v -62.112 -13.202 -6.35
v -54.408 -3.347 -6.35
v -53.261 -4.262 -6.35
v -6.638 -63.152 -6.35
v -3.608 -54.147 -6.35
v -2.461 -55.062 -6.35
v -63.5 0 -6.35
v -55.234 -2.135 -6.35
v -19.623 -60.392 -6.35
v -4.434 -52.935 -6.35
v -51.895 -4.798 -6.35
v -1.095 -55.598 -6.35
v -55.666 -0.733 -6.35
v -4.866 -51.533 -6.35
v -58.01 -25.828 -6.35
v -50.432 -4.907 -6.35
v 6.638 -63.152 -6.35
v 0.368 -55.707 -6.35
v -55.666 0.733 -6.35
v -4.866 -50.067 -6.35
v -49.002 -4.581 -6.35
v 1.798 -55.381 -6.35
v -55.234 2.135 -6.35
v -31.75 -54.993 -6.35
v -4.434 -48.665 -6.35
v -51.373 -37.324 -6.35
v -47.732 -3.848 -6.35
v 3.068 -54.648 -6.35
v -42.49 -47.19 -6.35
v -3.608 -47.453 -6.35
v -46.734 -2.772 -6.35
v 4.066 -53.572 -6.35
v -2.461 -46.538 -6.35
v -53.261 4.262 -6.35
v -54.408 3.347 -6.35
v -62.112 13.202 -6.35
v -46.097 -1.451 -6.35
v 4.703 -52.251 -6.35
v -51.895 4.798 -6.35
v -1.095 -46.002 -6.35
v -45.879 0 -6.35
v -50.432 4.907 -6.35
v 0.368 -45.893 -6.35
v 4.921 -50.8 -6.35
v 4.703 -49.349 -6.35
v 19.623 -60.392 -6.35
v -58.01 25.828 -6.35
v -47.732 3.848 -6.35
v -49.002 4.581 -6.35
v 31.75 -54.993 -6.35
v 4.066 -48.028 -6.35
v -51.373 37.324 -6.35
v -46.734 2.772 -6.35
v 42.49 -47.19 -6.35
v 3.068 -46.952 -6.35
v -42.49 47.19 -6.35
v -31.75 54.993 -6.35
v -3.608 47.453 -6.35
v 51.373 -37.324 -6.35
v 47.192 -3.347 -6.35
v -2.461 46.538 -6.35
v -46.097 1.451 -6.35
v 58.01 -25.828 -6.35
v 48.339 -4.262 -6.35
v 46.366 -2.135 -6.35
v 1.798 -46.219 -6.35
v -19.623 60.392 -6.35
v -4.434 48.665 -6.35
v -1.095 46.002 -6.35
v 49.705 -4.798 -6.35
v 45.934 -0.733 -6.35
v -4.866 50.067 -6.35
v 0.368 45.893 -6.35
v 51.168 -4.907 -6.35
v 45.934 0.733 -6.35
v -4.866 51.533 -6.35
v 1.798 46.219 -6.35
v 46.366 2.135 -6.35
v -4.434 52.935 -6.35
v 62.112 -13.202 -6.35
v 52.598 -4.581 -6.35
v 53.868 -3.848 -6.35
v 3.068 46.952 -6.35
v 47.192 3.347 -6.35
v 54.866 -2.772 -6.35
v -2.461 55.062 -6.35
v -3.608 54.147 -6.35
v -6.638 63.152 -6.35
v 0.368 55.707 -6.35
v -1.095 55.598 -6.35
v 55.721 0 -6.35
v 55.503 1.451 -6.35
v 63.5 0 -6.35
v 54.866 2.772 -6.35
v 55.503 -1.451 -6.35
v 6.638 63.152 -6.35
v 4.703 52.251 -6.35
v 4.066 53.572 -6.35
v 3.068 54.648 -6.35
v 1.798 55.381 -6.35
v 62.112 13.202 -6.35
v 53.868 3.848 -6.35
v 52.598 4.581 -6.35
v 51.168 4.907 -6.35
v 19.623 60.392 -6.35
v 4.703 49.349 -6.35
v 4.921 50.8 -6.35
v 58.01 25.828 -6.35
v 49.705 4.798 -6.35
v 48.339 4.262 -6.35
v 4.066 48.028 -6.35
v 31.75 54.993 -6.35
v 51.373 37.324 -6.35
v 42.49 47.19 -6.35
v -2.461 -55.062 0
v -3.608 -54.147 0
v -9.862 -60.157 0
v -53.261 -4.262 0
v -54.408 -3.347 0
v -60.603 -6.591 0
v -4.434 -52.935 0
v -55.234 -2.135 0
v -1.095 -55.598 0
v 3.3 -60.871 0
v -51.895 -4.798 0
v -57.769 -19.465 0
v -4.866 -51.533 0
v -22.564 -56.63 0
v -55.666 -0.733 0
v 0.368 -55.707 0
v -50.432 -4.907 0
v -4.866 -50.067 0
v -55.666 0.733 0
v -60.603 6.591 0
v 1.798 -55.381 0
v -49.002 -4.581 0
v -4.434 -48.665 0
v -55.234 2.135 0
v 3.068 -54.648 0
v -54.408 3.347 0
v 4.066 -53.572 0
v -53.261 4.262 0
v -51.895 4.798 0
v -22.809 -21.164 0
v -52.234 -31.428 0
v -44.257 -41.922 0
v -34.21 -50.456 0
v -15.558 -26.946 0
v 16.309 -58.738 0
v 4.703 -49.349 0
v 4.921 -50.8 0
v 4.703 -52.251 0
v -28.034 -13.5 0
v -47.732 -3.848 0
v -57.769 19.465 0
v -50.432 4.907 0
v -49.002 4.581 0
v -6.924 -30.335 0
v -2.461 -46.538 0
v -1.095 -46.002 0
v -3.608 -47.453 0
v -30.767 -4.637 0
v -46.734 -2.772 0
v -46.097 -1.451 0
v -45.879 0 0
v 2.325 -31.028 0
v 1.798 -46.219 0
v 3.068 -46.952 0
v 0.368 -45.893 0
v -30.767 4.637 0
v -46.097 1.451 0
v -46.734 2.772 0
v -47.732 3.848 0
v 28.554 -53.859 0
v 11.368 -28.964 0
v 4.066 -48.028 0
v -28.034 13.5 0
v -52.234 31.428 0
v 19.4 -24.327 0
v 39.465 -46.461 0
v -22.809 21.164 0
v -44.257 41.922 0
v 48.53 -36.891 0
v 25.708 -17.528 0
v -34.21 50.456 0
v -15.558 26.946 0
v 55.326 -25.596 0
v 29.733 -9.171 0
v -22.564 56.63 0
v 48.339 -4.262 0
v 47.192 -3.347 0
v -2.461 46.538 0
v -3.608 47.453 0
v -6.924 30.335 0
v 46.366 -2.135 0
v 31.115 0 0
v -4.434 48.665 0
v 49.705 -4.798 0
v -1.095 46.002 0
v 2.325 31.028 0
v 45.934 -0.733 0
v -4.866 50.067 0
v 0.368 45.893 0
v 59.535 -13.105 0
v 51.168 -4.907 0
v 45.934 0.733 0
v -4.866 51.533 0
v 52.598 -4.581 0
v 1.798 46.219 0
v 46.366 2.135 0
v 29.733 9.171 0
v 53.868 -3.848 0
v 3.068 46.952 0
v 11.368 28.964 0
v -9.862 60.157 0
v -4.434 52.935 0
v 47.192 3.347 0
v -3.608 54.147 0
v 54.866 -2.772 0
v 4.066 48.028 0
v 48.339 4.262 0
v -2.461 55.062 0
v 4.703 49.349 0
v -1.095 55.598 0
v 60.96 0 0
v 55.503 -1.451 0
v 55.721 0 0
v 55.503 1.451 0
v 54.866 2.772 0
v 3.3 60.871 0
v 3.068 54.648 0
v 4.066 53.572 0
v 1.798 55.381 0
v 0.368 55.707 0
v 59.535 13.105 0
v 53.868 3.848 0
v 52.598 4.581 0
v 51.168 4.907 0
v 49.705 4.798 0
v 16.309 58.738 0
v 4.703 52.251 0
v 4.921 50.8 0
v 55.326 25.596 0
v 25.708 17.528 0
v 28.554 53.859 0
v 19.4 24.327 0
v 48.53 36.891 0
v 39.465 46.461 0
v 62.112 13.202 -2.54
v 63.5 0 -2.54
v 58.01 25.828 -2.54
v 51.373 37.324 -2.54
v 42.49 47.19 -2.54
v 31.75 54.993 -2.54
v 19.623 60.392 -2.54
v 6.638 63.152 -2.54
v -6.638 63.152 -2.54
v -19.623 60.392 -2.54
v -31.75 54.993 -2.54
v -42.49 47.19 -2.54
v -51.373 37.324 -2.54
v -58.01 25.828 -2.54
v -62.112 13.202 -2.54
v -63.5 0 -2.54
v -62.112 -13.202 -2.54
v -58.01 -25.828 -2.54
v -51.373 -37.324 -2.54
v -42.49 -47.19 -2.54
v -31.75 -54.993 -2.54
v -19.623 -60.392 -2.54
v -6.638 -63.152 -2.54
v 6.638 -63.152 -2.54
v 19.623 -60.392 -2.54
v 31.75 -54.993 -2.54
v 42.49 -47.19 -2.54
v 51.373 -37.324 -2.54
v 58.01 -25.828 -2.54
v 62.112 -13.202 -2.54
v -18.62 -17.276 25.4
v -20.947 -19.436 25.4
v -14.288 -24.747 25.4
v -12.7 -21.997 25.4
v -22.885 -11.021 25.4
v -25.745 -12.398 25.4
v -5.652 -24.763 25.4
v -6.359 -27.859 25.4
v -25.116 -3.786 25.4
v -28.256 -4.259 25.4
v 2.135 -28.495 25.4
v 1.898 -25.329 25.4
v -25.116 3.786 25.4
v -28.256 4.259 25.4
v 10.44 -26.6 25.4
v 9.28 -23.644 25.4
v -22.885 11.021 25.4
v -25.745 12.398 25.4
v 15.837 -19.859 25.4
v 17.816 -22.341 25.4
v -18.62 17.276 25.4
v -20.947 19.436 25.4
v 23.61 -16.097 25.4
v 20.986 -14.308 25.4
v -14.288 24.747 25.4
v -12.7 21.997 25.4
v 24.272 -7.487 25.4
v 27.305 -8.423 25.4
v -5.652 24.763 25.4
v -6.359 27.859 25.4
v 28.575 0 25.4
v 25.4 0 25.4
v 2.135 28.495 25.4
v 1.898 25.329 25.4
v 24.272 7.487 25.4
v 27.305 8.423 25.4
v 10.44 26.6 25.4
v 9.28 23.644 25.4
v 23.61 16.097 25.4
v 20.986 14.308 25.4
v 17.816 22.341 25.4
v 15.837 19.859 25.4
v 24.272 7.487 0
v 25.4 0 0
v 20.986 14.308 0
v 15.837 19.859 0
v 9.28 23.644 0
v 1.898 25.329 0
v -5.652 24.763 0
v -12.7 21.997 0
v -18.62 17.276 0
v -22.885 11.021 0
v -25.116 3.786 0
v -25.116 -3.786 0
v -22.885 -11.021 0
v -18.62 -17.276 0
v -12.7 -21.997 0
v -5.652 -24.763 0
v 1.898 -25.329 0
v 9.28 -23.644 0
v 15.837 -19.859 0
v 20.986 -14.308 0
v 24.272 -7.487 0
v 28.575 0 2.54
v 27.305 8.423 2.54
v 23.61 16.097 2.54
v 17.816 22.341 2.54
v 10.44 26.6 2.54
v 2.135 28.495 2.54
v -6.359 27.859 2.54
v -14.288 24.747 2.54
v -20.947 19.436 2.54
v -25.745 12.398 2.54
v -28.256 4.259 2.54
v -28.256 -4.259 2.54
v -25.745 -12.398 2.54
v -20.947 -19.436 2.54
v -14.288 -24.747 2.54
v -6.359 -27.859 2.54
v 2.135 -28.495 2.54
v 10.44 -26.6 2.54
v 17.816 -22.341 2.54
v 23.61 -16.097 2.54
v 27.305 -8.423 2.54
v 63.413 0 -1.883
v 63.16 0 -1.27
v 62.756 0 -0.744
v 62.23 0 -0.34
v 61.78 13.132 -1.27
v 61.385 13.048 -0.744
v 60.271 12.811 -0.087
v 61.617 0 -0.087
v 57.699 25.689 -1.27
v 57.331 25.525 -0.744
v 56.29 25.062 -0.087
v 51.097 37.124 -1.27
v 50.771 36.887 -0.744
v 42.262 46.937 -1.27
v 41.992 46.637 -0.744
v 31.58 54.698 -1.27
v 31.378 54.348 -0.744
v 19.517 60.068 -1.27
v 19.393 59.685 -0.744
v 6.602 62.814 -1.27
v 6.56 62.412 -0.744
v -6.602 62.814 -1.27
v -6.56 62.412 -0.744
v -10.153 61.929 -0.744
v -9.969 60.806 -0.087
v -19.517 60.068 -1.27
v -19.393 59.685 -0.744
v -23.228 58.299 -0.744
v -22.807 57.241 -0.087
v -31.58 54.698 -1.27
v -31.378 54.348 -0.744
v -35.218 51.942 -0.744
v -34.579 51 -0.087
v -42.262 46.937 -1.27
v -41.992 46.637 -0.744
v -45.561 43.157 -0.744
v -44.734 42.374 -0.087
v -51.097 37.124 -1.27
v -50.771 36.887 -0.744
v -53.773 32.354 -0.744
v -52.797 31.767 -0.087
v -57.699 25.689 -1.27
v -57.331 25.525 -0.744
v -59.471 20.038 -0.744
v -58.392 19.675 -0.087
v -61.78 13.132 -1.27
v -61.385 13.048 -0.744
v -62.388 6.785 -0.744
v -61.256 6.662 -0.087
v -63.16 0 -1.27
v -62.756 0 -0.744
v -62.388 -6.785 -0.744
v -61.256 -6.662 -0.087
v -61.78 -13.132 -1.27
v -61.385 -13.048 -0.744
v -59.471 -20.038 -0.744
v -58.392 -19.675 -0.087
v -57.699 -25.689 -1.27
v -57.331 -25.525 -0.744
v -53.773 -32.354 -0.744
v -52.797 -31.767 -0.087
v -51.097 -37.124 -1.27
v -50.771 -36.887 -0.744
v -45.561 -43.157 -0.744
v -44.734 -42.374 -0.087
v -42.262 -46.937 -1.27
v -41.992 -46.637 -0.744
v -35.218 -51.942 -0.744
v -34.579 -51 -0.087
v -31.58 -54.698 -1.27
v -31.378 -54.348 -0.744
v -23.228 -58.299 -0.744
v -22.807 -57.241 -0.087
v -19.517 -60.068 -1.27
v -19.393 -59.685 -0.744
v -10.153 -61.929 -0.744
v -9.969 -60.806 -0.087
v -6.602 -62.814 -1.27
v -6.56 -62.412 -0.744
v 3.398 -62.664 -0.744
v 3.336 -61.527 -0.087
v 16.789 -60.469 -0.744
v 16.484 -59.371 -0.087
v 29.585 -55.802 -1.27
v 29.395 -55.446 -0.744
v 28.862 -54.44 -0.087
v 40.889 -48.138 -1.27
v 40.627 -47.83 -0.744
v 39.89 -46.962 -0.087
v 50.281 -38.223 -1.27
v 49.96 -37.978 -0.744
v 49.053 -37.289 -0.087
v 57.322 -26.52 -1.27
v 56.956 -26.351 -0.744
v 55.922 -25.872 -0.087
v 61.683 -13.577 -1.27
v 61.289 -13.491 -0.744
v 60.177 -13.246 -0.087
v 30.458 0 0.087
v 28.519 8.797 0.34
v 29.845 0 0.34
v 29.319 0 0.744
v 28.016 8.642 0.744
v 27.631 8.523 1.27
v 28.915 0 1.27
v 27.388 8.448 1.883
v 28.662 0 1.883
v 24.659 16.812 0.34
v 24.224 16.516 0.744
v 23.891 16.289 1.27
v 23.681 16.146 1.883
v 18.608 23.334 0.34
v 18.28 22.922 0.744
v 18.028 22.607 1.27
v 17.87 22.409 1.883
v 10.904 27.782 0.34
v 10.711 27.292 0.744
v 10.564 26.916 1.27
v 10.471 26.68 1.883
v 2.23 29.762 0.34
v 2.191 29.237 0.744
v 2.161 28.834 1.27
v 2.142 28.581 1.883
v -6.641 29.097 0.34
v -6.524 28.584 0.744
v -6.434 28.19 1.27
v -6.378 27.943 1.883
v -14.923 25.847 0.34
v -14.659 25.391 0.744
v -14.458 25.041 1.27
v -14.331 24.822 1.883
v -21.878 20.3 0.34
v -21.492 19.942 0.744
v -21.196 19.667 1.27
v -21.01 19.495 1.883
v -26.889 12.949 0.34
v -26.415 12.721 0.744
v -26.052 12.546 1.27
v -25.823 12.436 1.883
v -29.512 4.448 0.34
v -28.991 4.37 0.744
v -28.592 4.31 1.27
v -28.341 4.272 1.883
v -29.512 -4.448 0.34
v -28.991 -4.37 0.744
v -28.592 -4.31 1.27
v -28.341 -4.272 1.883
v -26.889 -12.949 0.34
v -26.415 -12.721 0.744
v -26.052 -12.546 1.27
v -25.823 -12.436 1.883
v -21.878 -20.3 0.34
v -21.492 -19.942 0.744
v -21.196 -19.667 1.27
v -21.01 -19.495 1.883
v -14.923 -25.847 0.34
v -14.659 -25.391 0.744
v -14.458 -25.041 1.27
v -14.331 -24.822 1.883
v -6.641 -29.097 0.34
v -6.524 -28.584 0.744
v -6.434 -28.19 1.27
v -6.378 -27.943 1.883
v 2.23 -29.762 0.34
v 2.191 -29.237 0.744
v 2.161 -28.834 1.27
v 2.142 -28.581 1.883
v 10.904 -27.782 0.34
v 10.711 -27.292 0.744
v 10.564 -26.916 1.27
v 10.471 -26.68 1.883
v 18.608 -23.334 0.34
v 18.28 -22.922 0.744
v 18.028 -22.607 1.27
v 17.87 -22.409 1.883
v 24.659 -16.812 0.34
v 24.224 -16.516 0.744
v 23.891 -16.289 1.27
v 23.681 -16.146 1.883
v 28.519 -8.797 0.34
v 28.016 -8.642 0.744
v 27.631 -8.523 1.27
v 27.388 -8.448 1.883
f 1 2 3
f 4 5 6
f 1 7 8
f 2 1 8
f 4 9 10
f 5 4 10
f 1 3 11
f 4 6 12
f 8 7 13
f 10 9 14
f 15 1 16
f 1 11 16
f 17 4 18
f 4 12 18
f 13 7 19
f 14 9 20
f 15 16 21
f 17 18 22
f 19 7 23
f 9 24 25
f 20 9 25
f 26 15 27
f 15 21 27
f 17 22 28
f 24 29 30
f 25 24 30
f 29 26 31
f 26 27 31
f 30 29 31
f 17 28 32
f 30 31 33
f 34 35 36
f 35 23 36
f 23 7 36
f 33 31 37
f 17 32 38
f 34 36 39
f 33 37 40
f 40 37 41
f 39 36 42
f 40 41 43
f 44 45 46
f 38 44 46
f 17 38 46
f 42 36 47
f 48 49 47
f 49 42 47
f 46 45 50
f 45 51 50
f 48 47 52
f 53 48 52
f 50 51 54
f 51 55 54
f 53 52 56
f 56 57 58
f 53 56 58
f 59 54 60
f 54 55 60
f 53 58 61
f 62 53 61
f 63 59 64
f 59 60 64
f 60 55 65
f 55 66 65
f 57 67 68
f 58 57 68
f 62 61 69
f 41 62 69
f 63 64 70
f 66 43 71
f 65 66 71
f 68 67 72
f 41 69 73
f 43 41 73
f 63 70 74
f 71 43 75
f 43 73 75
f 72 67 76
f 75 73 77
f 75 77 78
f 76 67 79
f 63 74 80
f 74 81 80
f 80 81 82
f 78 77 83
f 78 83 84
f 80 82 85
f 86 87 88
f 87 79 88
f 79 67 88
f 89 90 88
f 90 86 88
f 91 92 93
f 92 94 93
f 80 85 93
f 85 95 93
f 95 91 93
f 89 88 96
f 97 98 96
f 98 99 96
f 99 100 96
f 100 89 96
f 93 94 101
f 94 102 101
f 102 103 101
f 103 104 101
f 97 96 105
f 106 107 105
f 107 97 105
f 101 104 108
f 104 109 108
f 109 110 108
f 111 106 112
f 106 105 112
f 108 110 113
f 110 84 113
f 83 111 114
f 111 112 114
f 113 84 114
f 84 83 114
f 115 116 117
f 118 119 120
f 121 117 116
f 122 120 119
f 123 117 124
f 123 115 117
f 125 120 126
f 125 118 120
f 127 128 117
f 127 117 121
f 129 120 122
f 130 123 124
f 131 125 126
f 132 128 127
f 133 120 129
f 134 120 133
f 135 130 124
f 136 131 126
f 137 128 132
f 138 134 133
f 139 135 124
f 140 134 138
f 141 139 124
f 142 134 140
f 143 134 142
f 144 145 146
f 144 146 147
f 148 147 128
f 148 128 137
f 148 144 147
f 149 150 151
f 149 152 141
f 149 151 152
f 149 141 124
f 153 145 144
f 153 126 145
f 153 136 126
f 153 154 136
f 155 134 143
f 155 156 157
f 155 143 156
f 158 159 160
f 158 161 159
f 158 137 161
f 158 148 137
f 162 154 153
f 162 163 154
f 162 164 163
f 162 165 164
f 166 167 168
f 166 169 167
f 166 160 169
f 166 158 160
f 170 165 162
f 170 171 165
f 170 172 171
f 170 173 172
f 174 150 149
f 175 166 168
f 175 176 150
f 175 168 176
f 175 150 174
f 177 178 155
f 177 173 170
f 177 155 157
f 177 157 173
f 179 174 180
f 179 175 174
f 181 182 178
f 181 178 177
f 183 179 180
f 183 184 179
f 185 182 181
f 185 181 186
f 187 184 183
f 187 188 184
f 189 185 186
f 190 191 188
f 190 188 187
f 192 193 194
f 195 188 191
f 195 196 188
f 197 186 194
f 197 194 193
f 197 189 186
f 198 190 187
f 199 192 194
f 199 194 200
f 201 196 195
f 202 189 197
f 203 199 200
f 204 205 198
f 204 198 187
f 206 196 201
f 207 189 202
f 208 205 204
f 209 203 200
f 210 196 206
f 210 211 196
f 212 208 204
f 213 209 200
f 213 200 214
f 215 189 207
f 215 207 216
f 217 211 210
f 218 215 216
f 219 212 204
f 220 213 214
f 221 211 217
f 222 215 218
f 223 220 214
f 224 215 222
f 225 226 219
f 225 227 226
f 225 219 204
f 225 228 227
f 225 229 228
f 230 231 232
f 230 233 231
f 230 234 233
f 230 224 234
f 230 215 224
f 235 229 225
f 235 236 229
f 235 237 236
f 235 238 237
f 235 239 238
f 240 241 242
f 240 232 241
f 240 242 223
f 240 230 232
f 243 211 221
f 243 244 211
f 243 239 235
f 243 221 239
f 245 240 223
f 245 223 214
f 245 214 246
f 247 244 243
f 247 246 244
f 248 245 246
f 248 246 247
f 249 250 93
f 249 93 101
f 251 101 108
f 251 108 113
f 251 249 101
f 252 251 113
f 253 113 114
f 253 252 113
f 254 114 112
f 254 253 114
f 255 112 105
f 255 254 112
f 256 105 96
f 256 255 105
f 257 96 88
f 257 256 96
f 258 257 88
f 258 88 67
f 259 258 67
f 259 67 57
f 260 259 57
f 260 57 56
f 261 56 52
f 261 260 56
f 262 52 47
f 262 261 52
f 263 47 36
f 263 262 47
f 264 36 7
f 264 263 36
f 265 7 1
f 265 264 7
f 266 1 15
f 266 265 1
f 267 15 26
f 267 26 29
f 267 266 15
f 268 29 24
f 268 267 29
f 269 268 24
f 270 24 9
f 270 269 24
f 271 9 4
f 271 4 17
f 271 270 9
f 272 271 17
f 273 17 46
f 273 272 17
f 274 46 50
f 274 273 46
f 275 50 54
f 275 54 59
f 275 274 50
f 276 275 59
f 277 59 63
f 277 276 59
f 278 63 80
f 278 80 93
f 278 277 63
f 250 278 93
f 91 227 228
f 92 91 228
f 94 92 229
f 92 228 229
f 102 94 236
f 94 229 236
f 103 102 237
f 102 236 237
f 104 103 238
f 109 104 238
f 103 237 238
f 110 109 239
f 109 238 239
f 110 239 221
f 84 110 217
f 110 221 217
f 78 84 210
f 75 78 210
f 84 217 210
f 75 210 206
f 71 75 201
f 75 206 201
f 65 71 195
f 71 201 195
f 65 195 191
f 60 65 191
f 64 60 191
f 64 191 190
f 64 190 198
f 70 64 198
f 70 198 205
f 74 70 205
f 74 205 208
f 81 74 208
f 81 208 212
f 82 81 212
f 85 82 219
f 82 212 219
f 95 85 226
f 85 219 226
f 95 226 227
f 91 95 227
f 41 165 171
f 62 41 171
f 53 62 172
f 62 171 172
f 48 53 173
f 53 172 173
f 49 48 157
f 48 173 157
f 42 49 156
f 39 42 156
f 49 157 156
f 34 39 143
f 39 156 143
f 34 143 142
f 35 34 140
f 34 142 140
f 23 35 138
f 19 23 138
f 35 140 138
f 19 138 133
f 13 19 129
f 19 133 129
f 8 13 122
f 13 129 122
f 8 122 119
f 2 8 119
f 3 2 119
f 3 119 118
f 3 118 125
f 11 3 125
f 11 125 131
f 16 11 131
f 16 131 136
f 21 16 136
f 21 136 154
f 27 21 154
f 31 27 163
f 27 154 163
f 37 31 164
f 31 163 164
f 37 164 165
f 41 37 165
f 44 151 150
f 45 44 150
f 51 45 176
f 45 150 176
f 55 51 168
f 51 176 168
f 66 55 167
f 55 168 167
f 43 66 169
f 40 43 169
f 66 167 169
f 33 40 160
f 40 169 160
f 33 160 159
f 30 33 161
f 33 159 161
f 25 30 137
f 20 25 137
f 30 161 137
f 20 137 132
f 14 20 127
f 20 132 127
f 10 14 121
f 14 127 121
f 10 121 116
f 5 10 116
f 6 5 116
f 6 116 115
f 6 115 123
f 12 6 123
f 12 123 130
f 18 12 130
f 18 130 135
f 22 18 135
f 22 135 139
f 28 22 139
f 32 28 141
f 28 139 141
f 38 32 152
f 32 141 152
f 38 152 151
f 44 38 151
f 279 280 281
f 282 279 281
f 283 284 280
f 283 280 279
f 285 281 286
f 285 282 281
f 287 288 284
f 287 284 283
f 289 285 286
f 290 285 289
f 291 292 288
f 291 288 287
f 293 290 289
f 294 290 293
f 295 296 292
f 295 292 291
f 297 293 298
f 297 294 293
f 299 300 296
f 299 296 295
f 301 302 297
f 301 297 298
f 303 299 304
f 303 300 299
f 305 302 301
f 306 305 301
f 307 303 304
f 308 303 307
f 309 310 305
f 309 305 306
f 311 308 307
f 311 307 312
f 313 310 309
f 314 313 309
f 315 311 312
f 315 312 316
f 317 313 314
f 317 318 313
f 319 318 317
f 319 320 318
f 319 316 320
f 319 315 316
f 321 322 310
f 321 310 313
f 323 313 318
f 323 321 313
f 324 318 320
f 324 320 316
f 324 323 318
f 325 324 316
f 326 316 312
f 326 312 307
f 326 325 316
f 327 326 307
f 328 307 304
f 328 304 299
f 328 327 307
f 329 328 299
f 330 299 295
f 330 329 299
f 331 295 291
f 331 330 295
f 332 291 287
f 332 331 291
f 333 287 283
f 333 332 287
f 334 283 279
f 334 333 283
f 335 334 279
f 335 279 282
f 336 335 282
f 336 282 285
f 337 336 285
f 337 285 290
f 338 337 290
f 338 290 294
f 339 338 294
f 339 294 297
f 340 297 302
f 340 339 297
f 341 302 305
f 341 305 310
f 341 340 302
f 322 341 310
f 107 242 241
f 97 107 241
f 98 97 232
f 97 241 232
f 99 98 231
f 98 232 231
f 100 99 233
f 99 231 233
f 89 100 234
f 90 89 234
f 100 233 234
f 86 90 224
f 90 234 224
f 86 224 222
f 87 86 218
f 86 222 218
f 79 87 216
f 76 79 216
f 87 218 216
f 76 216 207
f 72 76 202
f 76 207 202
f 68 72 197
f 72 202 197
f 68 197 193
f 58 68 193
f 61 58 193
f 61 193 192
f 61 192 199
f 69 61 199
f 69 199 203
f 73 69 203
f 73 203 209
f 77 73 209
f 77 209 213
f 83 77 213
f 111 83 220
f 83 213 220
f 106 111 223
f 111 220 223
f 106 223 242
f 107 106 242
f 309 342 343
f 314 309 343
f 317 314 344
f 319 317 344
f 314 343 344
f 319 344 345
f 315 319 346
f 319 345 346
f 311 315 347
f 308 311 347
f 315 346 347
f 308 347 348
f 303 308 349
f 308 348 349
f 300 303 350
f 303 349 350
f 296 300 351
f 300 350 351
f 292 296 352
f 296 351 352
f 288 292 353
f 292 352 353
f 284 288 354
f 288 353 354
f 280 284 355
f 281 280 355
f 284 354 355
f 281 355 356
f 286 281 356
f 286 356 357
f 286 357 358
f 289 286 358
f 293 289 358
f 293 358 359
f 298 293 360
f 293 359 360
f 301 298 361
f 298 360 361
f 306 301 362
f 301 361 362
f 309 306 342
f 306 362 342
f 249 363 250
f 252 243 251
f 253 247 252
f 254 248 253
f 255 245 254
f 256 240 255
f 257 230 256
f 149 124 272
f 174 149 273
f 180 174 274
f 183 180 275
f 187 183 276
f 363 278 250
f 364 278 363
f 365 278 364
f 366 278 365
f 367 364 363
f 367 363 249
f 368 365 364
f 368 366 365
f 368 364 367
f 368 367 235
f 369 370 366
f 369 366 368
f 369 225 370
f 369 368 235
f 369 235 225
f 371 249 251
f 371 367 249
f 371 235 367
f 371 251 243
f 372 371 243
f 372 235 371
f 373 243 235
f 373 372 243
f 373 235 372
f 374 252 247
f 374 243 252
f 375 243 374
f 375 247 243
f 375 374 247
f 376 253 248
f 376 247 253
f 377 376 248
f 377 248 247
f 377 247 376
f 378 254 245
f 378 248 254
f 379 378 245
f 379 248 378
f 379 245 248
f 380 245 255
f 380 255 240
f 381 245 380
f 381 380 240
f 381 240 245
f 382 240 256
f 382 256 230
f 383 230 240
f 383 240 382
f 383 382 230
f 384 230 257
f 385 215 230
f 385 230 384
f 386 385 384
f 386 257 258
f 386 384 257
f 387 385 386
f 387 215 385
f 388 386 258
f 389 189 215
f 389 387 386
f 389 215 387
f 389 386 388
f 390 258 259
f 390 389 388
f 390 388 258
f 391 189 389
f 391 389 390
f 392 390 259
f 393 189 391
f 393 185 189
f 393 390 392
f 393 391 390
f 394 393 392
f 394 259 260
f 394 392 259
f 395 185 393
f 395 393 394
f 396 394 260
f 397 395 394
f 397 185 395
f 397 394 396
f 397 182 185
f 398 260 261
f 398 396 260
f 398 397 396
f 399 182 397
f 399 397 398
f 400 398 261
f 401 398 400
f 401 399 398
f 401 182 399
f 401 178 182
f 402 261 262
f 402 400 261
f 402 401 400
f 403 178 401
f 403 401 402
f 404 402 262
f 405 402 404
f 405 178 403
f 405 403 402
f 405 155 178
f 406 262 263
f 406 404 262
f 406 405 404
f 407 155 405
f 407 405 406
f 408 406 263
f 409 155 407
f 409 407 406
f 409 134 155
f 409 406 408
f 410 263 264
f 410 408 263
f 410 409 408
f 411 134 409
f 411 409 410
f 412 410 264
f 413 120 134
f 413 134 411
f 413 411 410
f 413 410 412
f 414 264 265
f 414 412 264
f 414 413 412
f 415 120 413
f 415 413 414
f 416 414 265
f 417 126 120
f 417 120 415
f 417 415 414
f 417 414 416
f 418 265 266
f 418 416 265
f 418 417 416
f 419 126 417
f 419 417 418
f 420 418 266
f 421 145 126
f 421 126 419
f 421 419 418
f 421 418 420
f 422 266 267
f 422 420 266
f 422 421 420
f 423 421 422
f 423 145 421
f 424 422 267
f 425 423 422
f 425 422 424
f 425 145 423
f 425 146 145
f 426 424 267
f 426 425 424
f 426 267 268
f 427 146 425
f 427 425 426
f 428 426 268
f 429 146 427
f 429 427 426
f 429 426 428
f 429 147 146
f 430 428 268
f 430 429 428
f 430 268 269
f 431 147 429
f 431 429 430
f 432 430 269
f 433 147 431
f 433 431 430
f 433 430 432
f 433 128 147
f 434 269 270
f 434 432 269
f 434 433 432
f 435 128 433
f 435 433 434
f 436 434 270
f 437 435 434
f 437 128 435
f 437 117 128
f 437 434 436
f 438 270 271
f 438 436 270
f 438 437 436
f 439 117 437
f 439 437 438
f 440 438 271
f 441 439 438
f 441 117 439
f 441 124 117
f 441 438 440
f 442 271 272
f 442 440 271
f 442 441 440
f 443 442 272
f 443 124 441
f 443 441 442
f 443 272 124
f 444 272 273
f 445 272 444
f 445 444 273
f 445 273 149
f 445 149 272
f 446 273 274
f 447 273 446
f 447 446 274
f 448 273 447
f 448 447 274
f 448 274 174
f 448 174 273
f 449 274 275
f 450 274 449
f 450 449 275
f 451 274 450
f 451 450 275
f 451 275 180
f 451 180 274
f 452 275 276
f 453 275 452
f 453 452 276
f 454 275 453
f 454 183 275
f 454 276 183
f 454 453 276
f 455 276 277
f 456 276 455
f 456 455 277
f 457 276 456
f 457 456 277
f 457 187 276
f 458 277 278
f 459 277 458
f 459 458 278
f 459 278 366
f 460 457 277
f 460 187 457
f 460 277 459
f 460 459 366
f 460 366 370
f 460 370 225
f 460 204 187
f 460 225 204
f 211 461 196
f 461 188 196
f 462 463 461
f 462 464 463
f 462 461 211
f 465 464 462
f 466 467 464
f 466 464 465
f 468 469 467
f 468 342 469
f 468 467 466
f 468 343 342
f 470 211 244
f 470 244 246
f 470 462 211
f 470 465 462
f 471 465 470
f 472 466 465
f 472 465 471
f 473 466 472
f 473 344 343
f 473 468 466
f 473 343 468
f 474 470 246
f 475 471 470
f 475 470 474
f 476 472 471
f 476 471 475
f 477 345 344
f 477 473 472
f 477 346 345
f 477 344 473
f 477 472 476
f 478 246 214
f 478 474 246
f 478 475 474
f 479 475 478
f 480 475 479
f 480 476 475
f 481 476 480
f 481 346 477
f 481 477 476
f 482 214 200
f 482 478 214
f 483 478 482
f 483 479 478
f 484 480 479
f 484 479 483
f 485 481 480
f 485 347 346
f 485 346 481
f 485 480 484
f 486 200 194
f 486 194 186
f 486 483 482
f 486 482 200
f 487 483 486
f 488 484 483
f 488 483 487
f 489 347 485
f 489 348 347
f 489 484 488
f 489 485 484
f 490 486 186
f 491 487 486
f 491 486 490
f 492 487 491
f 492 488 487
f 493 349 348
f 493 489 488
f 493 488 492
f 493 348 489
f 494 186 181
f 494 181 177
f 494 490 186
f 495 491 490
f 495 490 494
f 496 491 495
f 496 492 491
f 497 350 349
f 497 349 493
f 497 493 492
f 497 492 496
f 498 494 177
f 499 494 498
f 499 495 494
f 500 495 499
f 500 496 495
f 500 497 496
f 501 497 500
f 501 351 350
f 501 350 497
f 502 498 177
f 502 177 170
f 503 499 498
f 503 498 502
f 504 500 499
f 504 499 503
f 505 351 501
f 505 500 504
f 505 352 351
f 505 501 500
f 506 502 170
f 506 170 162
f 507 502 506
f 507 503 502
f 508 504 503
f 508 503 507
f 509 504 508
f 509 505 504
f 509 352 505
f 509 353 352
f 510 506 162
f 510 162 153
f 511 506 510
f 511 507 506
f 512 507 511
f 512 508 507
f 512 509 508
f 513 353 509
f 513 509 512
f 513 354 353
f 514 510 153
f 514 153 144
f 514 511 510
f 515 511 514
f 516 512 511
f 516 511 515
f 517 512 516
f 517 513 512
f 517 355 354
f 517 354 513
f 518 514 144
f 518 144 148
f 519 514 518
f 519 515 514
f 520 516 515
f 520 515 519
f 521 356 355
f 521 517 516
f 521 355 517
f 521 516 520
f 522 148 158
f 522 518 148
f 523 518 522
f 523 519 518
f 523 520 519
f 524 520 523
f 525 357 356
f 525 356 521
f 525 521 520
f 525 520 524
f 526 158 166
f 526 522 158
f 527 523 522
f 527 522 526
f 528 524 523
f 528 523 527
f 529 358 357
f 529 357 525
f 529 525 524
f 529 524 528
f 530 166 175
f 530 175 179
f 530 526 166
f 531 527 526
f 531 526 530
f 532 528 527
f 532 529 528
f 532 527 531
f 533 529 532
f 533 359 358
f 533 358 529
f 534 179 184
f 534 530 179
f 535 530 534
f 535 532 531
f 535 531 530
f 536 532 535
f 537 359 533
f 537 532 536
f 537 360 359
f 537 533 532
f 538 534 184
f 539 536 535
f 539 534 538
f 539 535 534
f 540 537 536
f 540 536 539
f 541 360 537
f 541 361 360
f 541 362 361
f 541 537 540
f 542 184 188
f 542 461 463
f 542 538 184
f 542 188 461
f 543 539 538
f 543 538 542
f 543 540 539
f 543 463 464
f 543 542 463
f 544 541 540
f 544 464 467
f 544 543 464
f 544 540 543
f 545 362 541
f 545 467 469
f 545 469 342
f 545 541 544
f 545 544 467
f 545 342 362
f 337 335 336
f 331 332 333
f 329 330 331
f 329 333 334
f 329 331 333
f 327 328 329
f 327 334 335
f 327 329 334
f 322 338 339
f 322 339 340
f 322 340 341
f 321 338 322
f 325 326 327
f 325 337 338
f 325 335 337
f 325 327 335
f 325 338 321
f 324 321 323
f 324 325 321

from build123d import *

# Parameters (mm, degrees)
F0_R     = 28.575
F0_R_2   = 25.4
F1_DEPTH = 25.4
F2_R     = 63.5
F3_DEPTH = 6.35
F4_R     = 2.54
F5_R     = 4.92125
F6_DEPTH = 6.35


with BuildPart() as f1:
    # F0 (on Top) → F1 (new body)
    with BuildSketch(Plane.XY):
        Circle(F0_R)
        Circle(F0_R_2, mode=Mode.SUBTRACT)
    extrude(amount=F1_DEPTH)

    # F2 (on Top) → F3 (join)
    with BuildSketch(Plane.XY):
        Circle(F2_R)
    extrude(amount=-F3_DEPTH)

    # F4
    f4_edges = [f1.edges().sort_by_distance(p)[0] for p in [
        (-63.5, 0, 0),
        (-28.575, 0, 0),
    ]]
    fillet(f4_edges, radius=F4_R)

    # F5 (on face) → F6 (cut, through all)
    with BuildSketch(Plane.XY):
        with Locations((50.8, 0)):
            Circle(F5_R)
        with Locations((0, -50.8)):
            Circle(F5_R)
        with Locations((-50.8, 0)):
            Circle(F5_R)
        with Locations((0, 50.8)):
            Circle(F5_R)
    extrude(amount=-F6_DEPTH, mode=Mode.SUBTRACT)


solid = f1.part
